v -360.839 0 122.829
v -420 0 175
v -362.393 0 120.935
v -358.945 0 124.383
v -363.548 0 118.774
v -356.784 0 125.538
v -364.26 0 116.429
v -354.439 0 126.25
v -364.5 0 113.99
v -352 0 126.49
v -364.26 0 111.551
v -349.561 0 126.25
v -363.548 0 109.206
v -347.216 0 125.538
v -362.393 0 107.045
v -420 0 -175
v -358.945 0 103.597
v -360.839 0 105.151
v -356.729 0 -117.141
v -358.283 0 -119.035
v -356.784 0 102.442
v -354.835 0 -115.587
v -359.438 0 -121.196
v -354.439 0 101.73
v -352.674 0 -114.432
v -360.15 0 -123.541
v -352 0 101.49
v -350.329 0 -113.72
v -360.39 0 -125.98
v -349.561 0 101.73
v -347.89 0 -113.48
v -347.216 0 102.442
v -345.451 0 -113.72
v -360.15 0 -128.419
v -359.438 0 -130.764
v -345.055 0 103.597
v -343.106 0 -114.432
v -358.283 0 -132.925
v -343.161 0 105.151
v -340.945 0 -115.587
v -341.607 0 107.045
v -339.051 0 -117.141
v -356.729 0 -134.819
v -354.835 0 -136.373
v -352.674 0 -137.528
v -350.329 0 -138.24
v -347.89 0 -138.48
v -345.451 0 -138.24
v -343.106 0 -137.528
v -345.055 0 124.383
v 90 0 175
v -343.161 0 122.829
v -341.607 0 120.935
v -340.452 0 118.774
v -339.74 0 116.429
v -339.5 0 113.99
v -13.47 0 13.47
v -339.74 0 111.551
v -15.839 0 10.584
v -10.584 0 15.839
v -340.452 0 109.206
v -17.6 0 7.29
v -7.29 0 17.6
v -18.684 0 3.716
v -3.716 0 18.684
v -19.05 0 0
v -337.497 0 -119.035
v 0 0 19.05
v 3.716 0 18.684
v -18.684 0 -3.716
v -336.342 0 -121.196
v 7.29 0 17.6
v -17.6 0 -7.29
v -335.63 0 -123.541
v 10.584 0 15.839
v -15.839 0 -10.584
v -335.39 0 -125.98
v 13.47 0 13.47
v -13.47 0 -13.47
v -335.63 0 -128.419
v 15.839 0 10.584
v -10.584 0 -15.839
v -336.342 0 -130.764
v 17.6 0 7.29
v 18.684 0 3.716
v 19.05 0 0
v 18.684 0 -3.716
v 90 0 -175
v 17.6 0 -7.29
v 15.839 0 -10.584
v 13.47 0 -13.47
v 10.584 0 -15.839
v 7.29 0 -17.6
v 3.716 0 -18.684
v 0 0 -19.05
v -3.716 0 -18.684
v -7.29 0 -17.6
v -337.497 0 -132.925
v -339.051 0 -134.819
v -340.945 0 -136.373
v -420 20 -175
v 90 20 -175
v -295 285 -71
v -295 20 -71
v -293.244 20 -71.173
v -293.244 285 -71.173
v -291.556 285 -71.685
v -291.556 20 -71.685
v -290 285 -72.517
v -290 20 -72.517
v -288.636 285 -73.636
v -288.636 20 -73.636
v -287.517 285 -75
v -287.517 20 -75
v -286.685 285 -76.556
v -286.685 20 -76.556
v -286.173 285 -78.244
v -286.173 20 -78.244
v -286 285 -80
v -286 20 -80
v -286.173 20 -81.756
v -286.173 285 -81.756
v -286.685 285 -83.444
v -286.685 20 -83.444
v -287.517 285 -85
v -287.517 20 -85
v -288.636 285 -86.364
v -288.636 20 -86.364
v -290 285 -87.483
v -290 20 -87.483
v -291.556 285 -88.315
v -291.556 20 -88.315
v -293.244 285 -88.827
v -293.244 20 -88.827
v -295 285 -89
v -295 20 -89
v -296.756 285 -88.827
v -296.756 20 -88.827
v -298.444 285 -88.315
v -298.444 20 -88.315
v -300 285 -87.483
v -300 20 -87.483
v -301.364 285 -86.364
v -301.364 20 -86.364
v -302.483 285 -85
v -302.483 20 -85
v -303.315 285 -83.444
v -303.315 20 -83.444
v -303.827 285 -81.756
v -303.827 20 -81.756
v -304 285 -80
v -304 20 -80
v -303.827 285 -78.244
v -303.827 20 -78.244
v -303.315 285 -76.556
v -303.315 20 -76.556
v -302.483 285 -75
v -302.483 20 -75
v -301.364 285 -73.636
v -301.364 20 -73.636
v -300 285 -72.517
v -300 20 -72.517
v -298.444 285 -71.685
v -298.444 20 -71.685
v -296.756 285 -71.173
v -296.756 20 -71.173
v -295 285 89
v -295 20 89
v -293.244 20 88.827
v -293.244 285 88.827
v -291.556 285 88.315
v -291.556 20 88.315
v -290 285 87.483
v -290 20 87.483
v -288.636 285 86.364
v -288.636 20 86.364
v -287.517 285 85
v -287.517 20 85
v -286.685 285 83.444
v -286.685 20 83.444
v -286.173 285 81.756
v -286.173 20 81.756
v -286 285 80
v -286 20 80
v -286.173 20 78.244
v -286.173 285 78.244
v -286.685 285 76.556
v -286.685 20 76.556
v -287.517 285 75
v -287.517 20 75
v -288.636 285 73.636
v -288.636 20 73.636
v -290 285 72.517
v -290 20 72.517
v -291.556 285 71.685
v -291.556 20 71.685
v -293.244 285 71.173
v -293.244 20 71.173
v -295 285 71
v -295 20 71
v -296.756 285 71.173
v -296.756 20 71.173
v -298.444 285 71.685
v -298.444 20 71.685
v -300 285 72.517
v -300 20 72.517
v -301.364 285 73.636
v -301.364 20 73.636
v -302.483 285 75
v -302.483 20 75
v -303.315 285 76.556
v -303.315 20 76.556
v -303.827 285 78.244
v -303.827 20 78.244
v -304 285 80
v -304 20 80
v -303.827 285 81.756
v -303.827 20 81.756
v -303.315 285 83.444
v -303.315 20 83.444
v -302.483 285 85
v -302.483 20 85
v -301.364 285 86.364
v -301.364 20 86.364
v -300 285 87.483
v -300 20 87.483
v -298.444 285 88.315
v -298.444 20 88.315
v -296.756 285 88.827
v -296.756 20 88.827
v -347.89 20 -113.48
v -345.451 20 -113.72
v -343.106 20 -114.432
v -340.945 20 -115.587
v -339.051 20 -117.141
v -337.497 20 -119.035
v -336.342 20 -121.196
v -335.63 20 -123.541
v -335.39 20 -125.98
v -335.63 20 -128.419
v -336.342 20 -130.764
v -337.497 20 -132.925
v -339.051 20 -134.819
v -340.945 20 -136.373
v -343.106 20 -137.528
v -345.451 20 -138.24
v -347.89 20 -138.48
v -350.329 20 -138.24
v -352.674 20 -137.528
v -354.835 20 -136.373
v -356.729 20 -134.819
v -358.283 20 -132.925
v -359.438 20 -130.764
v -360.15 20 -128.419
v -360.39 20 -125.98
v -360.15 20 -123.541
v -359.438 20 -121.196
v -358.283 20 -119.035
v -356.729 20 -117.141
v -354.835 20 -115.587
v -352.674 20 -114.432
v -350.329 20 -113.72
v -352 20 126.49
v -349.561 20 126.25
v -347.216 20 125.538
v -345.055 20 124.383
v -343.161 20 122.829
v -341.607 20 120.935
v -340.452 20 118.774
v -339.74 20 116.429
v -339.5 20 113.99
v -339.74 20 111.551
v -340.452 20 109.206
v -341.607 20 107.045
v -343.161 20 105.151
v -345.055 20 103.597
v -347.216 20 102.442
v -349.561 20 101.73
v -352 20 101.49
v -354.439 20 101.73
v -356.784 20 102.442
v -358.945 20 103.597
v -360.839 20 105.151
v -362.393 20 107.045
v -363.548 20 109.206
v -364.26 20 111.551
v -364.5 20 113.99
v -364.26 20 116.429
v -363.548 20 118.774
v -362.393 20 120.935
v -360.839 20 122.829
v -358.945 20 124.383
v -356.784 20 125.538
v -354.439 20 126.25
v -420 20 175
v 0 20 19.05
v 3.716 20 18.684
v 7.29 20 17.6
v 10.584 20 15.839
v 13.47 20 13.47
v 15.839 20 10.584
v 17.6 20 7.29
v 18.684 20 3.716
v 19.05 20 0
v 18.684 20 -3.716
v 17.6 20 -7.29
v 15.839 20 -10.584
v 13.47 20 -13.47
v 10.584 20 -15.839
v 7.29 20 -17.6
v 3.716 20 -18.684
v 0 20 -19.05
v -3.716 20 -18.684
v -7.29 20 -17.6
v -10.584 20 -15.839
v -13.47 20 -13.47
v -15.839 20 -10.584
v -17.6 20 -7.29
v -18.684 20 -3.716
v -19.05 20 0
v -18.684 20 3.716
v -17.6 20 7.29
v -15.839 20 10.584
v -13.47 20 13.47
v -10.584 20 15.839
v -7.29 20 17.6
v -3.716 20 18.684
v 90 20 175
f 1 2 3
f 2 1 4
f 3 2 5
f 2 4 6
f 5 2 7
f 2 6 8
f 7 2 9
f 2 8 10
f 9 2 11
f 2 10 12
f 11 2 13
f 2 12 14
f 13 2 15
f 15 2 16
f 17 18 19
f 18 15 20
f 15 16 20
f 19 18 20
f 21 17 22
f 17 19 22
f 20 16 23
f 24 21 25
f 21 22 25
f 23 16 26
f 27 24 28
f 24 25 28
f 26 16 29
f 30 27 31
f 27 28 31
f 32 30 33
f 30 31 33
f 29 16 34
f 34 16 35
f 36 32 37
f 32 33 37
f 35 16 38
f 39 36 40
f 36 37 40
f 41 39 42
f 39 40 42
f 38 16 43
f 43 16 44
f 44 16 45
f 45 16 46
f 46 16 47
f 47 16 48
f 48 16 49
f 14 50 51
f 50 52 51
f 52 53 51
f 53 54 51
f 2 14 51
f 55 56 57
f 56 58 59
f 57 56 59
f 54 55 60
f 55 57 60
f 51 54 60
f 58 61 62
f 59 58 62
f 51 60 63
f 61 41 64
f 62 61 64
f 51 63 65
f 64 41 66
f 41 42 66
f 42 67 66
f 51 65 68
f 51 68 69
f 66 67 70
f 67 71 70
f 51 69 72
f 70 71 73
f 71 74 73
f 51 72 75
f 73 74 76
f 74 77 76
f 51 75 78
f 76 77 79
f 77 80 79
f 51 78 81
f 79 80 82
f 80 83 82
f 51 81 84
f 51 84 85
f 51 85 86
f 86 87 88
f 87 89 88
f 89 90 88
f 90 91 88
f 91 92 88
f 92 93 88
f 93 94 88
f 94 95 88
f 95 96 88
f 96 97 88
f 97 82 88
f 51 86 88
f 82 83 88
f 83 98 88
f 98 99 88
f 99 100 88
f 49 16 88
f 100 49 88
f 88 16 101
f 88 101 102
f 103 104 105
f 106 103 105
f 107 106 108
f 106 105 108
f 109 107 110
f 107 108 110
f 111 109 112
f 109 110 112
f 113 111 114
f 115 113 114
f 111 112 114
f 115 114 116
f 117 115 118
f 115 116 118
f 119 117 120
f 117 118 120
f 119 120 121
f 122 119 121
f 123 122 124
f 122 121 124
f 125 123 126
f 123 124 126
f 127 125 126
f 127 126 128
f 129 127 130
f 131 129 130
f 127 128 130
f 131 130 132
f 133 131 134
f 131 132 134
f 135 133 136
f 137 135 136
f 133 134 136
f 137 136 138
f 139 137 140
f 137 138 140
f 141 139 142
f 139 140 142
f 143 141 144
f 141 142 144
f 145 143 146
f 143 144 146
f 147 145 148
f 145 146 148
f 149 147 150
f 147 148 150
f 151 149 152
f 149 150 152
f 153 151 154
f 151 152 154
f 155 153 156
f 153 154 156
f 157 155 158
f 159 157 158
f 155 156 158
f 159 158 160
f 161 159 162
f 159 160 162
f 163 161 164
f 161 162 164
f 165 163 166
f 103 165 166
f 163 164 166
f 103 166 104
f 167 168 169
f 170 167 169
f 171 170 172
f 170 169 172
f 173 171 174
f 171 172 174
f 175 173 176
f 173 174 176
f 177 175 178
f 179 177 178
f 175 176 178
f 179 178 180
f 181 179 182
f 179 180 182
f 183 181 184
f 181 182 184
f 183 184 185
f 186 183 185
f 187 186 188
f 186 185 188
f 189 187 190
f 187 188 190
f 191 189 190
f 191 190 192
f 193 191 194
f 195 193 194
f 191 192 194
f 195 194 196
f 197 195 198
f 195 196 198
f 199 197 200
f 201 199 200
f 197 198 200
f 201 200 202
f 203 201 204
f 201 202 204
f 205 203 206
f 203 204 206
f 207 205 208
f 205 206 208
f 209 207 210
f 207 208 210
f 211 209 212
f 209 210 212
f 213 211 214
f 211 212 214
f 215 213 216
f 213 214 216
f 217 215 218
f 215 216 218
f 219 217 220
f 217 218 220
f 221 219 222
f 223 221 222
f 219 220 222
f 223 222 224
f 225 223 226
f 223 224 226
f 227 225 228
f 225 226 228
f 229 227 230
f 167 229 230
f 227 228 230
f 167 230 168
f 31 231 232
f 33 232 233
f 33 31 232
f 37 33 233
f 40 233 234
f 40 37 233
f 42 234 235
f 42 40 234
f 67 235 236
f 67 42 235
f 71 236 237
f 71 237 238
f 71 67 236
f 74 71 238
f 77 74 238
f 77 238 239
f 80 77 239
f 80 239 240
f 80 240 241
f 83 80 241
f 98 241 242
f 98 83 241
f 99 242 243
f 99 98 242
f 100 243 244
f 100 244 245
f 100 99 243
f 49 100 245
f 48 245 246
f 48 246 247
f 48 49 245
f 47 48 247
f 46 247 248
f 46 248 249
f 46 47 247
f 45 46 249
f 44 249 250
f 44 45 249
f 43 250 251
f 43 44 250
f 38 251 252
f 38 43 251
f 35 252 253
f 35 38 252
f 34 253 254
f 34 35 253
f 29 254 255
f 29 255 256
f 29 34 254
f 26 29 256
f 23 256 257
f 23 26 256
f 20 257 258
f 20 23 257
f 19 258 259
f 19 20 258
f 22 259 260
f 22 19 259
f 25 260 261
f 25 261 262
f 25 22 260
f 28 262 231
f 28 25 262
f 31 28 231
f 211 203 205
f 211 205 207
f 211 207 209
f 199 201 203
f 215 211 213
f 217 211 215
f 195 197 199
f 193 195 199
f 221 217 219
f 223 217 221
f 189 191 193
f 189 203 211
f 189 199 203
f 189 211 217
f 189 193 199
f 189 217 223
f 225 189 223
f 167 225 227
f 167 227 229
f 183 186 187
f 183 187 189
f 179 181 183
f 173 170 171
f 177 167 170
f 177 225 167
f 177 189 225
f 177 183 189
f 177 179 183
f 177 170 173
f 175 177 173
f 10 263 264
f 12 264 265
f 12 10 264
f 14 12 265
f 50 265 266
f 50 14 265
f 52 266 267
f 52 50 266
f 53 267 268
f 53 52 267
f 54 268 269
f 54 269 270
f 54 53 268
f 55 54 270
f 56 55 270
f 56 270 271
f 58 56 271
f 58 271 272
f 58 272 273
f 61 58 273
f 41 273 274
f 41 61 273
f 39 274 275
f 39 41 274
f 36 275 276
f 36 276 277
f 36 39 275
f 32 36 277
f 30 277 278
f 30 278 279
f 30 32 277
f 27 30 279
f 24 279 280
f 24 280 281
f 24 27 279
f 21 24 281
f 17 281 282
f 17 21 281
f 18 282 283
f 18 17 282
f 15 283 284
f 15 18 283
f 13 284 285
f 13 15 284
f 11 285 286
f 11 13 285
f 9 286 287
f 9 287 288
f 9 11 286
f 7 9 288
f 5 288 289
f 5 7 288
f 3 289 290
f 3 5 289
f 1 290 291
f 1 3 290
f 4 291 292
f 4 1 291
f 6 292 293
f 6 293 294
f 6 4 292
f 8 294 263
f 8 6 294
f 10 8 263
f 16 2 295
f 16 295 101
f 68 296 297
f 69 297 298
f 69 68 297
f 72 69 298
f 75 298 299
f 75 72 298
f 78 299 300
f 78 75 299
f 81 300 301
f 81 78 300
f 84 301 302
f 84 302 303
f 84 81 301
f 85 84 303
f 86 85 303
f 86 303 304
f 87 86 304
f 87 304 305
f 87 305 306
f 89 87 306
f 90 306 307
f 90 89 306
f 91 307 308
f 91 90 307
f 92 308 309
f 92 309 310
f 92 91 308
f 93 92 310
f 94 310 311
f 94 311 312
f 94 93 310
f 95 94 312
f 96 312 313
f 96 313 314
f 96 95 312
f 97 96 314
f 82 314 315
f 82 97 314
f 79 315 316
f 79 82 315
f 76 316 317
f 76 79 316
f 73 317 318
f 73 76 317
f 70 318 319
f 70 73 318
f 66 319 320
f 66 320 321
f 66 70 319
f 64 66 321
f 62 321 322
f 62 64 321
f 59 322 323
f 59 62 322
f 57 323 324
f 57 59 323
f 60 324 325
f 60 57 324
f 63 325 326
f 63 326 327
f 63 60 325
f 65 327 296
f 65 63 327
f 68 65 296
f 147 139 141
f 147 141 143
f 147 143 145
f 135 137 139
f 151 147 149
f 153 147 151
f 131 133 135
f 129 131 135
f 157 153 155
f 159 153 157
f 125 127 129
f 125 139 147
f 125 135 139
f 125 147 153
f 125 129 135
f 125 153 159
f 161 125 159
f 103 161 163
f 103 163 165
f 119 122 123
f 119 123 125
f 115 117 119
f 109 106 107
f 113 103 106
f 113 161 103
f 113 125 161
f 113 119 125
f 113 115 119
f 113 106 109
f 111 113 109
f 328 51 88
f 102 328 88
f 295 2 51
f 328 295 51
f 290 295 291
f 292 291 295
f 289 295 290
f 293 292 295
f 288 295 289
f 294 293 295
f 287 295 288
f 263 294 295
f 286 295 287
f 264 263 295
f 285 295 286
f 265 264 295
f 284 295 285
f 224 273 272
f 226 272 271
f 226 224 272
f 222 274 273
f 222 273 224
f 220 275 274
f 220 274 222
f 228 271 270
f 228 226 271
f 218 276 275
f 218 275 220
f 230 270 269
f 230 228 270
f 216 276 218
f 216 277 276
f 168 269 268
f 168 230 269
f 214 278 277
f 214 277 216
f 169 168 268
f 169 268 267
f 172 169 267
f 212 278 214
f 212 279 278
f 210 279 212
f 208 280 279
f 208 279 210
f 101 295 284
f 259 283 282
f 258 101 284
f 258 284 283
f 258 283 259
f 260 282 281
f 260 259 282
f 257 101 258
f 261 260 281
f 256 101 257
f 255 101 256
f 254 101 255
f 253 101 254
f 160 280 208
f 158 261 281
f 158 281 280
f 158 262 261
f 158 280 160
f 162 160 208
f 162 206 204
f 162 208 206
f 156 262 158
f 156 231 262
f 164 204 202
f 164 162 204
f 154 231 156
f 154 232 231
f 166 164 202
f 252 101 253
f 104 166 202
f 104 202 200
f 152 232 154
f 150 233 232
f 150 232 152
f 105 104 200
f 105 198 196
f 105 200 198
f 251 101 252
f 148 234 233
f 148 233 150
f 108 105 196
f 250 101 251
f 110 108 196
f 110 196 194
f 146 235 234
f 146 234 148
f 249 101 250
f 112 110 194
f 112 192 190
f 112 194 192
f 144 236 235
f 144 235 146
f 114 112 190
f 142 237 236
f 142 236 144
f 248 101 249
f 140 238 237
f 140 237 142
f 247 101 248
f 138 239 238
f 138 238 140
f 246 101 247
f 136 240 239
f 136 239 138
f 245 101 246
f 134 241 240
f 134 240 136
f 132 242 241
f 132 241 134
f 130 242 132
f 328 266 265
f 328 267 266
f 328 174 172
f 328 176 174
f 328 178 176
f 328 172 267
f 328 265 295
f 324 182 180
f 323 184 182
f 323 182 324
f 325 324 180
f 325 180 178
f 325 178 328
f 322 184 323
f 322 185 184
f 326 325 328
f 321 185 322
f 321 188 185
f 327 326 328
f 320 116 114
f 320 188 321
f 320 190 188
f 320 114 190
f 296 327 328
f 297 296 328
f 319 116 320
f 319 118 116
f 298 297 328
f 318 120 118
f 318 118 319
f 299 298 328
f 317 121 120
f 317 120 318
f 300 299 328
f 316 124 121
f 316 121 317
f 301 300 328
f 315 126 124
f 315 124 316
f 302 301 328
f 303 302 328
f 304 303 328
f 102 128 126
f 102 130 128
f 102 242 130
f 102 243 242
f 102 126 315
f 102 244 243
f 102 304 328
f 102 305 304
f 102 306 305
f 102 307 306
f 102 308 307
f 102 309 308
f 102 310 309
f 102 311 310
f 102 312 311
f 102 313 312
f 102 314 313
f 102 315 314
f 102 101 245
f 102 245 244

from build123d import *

# Parameters (mm, degrees)
SKETCH1_W           = 510
SKETCH1_H           = 350
SKETCH1_R           = 19.05
SKETCH1_R_2         = 12.5
BOSS_EXTRUDE1_DEPTH = 20
SKETCH3_R           = 9
BOSS_EXTRUDE2_DEPTH = 265


with BuildPart() as part:
    # Sketch1 → Boss-Extrude1 (new body)
    with BuildSketch(Plane(origin=(0, 0, 0), x_dir=(1, 0, 0), z_dir=(0, 1, 0))):
        with Locations((-165, 0)):
            Rectangle(SKETCH1_W, SKETCH1_H)
        with Locations(Location((0, 0, 0), (0, 0, 270))):
            Circle(SKETCH1_R, mode=Mode.SUBTRACT)
        with Locations(Location((-347.89, 125.98, 0), (0, 0, 270))):
            Circle(SKETCH1_R_2, mode=Mode.SUBTRACT)
        with Locations(Location((-352, -113.99, 0), (0, 0, 270))):
            Circle(SKETCH1_R_2, mode=Mode.SUBTRACT)
    extrude(amount=BOSS_EXTRUDE1_DEPTH)

    # Sketch3 → Boss-Extrude2 (add)
    with BuildSketch(Plane(origin=(0, 20, 0), x_dir=(1, 0, 0), z_dir=(0, 1, 0))):
        with Locations(Location((-295, 80, 0), (0, 0, 270))):
            Circle(SKETCH3_R)
        with Locations(Location((-295, -80, 0), (0, 0, 270))):
            Circle(SKETCH3_R)
    extrude(amount=BOSS_EXTRUDE2_DEPTH)


solid = part.part
